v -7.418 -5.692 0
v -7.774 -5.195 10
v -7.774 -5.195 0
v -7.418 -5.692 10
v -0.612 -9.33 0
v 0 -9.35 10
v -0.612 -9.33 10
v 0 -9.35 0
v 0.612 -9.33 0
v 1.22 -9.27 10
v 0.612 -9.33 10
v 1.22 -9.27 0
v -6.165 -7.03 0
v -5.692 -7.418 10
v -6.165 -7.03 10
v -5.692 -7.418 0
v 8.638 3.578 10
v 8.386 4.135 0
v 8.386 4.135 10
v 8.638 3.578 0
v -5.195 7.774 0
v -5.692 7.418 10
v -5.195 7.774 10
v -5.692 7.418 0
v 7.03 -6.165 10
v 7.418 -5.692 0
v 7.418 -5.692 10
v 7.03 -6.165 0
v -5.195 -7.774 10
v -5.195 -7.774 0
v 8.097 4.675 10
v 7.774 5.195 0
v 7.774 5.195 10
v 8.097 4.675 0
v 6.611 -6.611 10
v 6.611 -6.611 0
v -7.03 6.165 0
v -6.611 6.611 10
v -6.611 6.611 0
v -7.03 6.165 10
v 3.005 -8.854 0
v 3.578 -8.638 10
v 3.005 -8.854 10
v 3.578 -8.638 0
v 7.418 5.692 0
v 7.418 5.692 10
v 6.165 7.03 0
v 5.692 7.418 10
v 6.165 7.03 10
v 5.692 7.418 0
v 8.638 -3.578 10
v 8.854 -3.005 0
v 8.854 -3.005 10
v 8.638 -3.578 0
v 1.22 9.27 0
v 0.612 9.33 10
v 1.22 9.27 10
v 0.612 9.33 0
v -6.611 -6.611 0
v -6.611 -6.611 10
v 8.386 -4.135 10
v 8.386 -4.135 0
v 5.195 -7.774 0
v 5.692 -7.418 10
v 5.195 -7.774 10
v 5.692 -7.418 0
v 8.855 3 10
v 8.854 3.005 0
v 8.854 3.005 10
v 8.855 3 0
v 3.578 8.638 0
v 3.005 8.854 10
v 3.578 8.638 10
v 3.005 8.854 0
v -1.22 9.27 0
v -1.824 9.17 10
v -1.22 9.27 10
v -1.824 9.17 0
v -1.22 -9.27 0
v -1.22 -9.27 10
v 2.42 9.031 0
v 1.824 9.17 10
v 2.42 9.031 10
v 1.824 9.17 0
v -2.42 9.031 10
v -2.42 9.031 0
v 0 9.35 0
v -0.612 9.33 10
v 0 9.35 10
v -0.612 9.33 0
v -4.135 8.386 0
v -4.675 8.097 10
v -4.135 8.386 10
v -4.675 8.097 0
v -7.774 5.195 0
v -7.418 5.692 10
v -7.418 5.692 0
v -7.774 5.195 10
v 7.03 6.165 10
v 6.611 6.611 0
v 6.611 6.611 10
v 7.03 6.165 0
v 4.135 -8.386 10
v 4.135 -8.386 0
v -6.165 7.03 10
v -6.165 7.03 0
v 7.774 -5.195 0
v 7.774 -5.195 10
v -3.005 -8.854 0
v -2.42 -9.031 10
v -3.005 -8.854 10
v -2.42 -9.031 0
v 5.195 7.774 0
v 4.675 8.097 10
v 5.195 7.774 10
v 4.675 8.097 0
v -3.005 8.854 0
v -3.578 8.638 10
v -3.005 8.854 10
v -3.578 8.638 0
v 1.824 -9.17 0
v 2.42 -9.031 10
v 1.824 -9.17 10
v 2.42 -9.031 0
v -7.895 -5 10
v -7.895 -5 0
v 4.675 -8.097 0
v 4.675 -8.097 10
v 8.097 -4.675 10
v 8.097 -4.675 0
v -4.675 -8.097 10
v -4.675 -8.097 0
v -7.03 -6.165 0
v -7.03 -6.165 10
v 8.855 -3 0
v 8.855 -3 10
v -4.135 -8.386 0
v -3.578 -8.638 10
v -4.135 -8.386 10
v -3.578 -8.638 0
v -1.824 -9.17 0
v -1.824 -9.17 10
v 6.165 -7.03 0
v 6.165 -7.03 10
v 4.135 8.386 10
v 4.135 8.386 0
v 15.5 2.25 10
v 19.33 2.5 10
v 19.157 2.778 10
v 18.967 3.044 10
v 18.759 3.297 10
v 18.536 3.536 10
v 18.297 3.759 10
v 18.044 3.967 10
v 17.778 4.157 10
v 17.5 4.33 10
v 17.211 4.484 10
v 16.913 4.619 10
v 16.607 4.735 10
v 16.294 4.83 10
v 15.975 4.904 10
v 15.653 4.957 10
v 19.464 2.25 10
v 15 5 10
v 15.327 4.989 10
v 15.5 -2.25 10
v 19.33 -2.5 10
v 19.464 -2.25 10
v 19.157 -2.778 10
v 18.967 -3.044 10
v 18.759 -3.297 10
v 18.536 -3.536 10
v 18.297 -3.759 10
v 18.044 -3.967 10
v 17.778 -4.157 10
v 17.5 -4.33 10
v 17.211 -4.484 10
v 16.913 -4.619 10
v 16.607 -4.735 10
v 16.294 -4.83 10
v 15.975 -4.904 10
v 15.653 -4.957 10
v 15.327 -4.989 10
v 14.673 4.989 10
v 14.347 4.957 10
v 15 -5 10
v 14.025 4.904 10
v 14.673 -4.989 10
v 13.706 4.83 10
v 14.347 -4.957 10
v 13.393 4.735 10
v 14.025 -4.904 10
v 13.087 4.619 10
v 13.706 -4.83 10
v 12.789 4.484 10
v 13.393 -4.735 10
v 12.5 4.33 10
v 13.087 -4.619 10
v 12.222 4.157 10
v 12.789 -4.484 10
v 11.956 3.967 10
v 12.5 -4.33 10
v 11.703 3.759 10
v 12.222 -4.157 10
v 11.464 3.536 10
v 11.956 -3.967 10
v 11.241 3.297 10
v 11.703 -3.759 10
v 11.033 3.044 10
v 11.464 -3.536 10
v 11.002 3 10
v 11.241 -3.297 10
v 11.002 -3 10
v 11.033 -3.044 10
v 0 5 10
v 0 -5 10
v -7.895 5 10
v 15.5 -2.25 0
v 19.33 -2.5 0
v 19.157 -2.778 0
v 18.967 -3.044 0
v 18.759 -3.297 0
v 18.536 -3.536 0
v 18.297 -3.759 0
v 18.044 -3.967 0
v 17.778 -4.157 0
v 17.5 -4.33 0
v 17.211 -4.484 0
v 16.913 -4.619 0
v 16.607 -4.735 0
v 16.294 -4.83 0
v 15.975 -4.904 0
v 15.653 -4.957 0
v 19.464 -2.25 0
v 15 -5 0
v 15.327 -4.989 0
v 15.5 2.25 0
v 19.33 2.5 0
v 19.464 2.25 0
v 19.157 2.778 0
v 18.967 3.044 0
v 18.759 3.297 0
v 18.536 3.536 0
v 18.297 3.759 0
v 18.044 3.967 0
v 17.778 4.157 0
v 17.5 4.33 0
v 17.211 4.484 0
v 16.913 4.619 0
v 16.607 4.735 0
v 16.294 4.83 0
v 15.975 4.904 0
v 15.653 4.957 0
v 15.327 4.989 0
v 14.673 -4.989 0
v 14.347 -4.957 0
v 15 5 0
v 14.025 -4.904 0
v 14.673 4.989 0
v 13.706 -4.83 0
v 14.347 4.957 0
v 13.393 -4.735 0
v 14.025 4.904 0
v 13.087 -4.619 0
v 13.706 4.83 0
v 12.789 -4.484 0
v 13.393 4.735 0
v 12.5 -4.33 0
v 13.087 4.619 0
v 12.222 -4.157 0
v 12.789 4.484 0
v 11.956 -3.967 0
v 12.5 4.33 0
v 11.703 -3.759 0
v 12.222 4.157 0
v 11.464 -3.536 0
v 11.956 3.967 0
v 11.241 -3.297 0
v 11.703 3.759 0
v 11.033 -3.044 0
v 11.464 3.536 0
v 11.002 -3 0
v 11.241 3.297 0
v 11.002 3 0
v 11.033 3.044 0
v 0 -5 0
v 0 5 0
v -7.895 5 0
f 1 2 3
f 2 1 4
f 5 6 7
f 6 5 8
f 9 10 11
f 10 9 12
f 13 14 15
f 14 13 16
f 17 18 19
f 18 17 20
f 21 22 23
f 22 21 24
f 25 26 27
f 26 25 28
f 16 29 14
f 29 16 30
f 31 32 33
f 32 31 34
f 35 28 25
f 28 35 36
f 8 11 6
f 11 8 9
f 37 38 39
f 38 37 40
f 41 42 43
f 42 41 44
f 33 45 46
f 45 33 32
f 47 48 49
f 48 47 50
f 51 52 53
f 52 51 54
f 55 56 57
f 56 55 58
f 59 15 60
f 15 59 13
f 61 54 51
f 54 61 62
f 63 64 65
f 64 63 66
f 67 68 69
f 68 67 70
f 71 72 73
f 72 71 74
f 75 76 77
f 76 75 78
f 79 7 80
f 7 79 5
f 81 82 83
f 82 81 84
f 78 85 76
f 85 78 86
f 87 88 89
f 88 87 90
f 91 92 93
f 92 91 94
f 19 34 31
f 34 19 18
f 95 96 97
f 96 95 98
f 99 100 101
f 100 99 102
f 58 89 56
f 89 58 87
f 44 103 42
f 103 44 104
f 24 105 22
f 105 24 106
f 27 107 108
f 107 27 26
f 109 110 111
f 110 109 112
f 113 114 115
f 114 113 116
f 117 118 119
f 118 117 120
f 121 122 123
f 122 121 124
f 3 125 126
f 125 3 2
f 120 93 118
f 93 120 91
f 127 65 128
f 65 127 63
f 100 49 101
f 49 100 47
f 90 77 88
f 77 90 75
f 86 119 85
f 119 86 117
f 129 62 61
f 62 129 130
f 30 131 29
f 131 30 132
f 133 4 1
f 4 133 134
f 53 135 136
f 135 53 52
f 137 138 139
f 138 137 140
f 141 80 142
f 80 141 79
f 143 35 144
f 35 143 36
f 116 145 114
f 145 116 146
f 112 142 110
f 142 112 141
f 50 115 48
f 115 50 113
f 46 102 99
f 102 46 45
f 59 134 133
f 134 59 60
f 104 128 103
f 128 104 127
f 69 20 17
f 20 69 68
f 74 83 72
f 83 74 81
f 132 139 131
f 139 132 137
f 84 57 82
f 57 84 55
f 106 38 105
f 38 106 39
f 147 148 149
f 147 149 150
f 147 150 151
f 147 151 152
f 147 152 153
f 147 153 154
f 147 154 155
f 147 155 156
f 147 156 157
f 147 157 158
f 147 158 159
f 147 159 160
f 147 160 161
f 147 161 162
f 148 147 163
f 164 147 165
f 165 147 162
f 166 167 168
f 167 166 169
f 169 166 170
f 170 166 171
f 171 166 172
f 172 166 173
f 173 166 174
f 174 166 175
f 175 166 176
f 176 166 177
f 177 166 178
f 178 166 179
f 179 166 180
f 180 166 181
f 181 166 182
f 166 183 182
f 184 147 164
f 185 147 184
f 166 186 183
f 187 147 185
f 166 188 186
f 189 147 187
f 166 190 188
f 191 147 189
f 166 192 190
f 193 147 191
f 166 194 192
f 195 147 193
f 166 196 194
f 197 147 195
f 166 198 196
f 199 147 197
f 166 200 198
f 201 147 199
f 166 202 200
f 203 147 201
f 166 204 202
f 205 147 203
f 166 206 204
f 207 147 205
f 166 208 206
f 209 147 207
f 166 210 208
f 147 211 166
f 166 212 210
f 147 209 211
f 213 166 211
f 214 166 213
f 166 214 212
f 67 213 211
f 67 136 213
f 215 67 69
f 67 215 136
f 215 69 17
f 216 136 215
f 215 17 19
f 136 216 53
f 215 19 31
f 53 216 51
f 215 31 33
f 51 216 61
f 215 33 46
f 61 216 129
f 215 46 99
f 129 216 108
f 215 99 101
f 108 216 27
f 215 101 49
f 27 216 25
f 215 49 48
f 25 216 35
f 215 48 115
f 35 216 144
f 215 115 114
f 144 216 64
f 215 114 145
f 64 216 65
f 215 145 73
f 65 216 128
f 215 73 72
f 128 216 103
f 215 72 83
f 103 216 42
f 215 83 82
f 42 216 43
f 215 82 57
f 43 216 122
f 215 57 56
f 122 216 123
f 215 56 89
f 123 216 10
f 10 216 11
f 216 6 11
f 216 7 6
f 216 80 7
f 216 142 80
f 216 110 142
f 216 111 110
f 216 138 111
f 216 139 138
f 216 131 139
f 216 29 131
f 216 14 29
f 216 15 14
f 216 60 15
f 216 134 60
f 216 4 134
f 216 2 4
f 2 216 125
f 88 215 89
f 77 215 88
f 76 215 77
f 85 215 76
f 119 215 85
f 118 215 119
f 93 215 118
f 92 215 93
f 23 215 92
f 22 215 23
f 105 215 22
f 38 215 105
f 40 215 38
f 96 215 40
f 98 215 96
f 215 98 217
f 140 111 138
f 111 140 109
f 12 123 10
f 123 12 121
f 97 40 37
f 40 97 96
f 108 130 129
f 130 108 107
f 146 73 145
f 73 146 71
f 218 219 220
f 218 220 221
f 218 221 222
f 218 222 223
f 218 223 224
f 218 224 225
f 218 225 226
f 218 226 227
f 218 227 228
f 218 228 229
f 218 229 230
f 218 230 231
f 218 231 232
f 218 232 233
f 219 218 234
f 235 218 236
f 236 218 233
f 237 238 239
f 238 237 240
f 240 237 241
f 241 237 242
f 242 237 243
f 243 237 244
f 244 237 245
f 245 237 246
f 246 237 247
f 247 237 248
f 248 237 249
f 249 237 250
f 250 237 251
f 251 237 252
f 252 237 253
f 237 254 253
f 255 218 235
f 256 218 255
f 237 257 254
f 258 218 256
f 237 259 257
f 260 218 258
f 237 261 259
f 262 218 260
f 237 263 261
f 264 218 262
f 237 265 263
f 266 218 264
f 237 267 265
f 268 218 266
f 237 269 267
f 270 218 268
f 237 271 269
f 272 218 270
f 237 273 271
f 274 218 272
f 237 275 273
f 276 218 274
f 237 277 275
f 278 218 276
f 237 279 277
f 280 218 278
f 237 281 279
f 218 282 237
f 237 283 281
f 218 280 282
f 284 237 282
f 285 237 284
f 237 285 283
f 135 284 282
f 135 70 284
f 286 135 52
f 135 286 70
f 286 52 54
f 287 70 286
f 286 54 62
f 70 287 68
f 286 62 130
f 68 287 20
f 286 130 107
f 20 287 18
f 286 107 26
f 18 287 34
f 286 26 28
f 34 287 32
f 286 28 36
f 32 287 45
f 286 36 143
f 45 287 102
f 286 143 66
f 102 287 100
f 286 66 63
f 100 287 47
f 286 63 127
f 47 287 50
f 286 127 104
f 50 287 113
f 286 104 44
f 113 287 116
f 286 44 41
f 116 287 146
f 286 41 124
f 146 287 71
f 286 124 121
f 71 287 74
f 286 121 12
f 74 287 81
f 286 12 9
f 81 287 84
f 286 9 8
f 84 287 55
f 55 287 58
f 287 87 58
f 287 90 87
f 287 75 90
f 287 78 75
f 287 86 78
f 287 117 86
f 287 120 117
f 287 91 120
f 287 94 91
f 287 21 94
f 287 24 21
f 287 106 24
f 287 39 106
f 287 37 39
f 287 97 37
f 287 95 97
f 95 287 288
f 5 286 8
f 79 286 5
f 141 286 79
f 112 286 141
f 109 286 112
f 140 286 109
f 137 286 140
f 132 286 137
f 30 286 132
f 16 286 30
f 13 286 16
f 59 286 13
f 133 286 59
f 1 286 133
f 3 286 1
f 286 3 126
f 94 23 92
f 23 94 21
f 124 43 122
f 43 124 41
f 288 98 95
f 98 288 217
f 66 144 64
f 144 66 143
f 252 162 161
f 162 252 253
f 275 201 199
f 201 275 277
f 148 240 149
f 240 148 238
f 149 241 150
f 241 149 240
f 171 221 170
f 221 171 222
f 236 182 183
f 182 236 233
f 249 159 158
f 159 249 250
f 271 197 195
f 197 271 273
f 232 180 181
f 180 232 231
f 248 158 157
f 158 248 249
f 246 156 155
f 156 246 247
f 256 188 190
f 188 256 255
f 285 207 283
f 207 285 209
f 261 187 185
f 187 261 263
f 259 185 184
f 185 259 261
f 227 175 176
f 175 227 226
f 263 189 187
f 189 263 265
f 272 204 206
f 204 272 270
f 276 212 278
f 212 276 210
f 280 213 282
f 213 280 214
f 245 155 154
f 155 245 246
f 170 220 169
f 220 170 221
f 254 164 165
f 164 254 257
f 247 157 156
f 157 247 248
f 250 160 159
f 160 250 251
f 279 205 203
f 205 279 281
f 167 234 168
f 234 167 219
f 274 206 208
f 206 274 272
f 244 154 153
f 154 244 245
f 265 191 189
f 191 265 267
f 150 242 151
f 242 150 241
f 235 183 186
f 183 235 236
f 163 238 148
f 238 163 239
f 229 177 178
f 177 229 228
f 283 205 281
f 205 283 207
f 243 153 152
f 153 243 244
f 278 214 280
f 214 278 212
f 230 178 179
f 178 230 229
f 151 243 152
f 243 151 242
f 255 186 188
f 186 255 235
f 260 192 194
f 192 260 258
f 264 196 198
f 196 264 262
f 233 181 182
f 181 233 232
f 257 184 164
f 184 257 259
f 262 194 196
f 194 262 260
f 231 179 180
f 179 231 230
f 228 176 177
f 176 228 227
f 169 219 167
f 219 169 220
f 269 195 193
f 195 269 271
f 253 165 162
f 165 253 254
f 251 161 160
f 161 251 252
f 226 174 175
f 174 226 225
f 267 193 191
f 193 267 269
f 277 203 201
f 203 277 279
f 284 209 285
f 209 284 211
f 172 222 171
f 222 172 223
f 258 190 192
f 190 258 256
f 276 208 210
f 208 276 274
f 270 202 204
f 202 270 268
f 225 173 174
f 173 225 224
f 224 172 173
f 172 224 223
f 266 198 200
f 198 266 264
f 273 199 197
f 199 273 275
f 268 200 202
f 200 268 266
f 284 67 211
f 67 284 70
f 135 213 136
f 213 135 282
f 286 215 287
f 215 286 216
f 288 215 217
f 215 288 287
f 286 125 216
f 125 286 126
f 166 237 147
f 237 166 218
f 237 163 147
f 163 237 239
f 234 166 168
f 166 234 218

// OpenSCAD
// Snap-on tubing clip for 12.7 mm lab stand rod
// Print orientation: flat on bed, extruded in +Z

$fn = 96;

// ---- Dimensions (mm) ----
rod_d      = 12.7;   // stand rod diameter
ring_w     = 3;      // rod ring wall thickness
ring_od    = rod_d + 2*ring_w; // rod ring outer diameter (18.7)
opening_w  = 10;     // rod ring opening width (-X side)

tube_d     = 6;      // tubing inner diameter
tube_w     = 2;      // tubing wall thickness
tube_od    = tube_d + 2*tube_w; // tubing outer diameter (10)
tube_x     = 15;     // tubing ring centre X
opening_2  = 4.5;    // tubing opening width (+X side)

bridge_x   = 10;     // bridge X centre
bridge_w   = 6;      // bridge width (Y)
height     = 10;     // extrusion height

eps        = 0.5;    // cut overshoot

// ---- Model ----
difference() {
    union() {
        // Rod ring
        cylinder(d = ring_od, h = height);
        // Tubing ring
        translate([tube_x, 0, 0])
            cylinder(d = tube_od, h = height);
        // Bridge
        translate([bridge_x - 3, -bridge_w/2, 0])
            cube([6, bridge_w, height]);
    }
    // Rod ring opening
    translate([-ring_od/2 - eps, -opening_w/2, 0])
        cube([ring_od/2 + eps, opening_w, height + eps]);
    // Tubing opening
    translate([tube_x + eps, -opening_2/2, 0])
        cube([tube_od/2 + eps, opening_2, height + eps]);
}
